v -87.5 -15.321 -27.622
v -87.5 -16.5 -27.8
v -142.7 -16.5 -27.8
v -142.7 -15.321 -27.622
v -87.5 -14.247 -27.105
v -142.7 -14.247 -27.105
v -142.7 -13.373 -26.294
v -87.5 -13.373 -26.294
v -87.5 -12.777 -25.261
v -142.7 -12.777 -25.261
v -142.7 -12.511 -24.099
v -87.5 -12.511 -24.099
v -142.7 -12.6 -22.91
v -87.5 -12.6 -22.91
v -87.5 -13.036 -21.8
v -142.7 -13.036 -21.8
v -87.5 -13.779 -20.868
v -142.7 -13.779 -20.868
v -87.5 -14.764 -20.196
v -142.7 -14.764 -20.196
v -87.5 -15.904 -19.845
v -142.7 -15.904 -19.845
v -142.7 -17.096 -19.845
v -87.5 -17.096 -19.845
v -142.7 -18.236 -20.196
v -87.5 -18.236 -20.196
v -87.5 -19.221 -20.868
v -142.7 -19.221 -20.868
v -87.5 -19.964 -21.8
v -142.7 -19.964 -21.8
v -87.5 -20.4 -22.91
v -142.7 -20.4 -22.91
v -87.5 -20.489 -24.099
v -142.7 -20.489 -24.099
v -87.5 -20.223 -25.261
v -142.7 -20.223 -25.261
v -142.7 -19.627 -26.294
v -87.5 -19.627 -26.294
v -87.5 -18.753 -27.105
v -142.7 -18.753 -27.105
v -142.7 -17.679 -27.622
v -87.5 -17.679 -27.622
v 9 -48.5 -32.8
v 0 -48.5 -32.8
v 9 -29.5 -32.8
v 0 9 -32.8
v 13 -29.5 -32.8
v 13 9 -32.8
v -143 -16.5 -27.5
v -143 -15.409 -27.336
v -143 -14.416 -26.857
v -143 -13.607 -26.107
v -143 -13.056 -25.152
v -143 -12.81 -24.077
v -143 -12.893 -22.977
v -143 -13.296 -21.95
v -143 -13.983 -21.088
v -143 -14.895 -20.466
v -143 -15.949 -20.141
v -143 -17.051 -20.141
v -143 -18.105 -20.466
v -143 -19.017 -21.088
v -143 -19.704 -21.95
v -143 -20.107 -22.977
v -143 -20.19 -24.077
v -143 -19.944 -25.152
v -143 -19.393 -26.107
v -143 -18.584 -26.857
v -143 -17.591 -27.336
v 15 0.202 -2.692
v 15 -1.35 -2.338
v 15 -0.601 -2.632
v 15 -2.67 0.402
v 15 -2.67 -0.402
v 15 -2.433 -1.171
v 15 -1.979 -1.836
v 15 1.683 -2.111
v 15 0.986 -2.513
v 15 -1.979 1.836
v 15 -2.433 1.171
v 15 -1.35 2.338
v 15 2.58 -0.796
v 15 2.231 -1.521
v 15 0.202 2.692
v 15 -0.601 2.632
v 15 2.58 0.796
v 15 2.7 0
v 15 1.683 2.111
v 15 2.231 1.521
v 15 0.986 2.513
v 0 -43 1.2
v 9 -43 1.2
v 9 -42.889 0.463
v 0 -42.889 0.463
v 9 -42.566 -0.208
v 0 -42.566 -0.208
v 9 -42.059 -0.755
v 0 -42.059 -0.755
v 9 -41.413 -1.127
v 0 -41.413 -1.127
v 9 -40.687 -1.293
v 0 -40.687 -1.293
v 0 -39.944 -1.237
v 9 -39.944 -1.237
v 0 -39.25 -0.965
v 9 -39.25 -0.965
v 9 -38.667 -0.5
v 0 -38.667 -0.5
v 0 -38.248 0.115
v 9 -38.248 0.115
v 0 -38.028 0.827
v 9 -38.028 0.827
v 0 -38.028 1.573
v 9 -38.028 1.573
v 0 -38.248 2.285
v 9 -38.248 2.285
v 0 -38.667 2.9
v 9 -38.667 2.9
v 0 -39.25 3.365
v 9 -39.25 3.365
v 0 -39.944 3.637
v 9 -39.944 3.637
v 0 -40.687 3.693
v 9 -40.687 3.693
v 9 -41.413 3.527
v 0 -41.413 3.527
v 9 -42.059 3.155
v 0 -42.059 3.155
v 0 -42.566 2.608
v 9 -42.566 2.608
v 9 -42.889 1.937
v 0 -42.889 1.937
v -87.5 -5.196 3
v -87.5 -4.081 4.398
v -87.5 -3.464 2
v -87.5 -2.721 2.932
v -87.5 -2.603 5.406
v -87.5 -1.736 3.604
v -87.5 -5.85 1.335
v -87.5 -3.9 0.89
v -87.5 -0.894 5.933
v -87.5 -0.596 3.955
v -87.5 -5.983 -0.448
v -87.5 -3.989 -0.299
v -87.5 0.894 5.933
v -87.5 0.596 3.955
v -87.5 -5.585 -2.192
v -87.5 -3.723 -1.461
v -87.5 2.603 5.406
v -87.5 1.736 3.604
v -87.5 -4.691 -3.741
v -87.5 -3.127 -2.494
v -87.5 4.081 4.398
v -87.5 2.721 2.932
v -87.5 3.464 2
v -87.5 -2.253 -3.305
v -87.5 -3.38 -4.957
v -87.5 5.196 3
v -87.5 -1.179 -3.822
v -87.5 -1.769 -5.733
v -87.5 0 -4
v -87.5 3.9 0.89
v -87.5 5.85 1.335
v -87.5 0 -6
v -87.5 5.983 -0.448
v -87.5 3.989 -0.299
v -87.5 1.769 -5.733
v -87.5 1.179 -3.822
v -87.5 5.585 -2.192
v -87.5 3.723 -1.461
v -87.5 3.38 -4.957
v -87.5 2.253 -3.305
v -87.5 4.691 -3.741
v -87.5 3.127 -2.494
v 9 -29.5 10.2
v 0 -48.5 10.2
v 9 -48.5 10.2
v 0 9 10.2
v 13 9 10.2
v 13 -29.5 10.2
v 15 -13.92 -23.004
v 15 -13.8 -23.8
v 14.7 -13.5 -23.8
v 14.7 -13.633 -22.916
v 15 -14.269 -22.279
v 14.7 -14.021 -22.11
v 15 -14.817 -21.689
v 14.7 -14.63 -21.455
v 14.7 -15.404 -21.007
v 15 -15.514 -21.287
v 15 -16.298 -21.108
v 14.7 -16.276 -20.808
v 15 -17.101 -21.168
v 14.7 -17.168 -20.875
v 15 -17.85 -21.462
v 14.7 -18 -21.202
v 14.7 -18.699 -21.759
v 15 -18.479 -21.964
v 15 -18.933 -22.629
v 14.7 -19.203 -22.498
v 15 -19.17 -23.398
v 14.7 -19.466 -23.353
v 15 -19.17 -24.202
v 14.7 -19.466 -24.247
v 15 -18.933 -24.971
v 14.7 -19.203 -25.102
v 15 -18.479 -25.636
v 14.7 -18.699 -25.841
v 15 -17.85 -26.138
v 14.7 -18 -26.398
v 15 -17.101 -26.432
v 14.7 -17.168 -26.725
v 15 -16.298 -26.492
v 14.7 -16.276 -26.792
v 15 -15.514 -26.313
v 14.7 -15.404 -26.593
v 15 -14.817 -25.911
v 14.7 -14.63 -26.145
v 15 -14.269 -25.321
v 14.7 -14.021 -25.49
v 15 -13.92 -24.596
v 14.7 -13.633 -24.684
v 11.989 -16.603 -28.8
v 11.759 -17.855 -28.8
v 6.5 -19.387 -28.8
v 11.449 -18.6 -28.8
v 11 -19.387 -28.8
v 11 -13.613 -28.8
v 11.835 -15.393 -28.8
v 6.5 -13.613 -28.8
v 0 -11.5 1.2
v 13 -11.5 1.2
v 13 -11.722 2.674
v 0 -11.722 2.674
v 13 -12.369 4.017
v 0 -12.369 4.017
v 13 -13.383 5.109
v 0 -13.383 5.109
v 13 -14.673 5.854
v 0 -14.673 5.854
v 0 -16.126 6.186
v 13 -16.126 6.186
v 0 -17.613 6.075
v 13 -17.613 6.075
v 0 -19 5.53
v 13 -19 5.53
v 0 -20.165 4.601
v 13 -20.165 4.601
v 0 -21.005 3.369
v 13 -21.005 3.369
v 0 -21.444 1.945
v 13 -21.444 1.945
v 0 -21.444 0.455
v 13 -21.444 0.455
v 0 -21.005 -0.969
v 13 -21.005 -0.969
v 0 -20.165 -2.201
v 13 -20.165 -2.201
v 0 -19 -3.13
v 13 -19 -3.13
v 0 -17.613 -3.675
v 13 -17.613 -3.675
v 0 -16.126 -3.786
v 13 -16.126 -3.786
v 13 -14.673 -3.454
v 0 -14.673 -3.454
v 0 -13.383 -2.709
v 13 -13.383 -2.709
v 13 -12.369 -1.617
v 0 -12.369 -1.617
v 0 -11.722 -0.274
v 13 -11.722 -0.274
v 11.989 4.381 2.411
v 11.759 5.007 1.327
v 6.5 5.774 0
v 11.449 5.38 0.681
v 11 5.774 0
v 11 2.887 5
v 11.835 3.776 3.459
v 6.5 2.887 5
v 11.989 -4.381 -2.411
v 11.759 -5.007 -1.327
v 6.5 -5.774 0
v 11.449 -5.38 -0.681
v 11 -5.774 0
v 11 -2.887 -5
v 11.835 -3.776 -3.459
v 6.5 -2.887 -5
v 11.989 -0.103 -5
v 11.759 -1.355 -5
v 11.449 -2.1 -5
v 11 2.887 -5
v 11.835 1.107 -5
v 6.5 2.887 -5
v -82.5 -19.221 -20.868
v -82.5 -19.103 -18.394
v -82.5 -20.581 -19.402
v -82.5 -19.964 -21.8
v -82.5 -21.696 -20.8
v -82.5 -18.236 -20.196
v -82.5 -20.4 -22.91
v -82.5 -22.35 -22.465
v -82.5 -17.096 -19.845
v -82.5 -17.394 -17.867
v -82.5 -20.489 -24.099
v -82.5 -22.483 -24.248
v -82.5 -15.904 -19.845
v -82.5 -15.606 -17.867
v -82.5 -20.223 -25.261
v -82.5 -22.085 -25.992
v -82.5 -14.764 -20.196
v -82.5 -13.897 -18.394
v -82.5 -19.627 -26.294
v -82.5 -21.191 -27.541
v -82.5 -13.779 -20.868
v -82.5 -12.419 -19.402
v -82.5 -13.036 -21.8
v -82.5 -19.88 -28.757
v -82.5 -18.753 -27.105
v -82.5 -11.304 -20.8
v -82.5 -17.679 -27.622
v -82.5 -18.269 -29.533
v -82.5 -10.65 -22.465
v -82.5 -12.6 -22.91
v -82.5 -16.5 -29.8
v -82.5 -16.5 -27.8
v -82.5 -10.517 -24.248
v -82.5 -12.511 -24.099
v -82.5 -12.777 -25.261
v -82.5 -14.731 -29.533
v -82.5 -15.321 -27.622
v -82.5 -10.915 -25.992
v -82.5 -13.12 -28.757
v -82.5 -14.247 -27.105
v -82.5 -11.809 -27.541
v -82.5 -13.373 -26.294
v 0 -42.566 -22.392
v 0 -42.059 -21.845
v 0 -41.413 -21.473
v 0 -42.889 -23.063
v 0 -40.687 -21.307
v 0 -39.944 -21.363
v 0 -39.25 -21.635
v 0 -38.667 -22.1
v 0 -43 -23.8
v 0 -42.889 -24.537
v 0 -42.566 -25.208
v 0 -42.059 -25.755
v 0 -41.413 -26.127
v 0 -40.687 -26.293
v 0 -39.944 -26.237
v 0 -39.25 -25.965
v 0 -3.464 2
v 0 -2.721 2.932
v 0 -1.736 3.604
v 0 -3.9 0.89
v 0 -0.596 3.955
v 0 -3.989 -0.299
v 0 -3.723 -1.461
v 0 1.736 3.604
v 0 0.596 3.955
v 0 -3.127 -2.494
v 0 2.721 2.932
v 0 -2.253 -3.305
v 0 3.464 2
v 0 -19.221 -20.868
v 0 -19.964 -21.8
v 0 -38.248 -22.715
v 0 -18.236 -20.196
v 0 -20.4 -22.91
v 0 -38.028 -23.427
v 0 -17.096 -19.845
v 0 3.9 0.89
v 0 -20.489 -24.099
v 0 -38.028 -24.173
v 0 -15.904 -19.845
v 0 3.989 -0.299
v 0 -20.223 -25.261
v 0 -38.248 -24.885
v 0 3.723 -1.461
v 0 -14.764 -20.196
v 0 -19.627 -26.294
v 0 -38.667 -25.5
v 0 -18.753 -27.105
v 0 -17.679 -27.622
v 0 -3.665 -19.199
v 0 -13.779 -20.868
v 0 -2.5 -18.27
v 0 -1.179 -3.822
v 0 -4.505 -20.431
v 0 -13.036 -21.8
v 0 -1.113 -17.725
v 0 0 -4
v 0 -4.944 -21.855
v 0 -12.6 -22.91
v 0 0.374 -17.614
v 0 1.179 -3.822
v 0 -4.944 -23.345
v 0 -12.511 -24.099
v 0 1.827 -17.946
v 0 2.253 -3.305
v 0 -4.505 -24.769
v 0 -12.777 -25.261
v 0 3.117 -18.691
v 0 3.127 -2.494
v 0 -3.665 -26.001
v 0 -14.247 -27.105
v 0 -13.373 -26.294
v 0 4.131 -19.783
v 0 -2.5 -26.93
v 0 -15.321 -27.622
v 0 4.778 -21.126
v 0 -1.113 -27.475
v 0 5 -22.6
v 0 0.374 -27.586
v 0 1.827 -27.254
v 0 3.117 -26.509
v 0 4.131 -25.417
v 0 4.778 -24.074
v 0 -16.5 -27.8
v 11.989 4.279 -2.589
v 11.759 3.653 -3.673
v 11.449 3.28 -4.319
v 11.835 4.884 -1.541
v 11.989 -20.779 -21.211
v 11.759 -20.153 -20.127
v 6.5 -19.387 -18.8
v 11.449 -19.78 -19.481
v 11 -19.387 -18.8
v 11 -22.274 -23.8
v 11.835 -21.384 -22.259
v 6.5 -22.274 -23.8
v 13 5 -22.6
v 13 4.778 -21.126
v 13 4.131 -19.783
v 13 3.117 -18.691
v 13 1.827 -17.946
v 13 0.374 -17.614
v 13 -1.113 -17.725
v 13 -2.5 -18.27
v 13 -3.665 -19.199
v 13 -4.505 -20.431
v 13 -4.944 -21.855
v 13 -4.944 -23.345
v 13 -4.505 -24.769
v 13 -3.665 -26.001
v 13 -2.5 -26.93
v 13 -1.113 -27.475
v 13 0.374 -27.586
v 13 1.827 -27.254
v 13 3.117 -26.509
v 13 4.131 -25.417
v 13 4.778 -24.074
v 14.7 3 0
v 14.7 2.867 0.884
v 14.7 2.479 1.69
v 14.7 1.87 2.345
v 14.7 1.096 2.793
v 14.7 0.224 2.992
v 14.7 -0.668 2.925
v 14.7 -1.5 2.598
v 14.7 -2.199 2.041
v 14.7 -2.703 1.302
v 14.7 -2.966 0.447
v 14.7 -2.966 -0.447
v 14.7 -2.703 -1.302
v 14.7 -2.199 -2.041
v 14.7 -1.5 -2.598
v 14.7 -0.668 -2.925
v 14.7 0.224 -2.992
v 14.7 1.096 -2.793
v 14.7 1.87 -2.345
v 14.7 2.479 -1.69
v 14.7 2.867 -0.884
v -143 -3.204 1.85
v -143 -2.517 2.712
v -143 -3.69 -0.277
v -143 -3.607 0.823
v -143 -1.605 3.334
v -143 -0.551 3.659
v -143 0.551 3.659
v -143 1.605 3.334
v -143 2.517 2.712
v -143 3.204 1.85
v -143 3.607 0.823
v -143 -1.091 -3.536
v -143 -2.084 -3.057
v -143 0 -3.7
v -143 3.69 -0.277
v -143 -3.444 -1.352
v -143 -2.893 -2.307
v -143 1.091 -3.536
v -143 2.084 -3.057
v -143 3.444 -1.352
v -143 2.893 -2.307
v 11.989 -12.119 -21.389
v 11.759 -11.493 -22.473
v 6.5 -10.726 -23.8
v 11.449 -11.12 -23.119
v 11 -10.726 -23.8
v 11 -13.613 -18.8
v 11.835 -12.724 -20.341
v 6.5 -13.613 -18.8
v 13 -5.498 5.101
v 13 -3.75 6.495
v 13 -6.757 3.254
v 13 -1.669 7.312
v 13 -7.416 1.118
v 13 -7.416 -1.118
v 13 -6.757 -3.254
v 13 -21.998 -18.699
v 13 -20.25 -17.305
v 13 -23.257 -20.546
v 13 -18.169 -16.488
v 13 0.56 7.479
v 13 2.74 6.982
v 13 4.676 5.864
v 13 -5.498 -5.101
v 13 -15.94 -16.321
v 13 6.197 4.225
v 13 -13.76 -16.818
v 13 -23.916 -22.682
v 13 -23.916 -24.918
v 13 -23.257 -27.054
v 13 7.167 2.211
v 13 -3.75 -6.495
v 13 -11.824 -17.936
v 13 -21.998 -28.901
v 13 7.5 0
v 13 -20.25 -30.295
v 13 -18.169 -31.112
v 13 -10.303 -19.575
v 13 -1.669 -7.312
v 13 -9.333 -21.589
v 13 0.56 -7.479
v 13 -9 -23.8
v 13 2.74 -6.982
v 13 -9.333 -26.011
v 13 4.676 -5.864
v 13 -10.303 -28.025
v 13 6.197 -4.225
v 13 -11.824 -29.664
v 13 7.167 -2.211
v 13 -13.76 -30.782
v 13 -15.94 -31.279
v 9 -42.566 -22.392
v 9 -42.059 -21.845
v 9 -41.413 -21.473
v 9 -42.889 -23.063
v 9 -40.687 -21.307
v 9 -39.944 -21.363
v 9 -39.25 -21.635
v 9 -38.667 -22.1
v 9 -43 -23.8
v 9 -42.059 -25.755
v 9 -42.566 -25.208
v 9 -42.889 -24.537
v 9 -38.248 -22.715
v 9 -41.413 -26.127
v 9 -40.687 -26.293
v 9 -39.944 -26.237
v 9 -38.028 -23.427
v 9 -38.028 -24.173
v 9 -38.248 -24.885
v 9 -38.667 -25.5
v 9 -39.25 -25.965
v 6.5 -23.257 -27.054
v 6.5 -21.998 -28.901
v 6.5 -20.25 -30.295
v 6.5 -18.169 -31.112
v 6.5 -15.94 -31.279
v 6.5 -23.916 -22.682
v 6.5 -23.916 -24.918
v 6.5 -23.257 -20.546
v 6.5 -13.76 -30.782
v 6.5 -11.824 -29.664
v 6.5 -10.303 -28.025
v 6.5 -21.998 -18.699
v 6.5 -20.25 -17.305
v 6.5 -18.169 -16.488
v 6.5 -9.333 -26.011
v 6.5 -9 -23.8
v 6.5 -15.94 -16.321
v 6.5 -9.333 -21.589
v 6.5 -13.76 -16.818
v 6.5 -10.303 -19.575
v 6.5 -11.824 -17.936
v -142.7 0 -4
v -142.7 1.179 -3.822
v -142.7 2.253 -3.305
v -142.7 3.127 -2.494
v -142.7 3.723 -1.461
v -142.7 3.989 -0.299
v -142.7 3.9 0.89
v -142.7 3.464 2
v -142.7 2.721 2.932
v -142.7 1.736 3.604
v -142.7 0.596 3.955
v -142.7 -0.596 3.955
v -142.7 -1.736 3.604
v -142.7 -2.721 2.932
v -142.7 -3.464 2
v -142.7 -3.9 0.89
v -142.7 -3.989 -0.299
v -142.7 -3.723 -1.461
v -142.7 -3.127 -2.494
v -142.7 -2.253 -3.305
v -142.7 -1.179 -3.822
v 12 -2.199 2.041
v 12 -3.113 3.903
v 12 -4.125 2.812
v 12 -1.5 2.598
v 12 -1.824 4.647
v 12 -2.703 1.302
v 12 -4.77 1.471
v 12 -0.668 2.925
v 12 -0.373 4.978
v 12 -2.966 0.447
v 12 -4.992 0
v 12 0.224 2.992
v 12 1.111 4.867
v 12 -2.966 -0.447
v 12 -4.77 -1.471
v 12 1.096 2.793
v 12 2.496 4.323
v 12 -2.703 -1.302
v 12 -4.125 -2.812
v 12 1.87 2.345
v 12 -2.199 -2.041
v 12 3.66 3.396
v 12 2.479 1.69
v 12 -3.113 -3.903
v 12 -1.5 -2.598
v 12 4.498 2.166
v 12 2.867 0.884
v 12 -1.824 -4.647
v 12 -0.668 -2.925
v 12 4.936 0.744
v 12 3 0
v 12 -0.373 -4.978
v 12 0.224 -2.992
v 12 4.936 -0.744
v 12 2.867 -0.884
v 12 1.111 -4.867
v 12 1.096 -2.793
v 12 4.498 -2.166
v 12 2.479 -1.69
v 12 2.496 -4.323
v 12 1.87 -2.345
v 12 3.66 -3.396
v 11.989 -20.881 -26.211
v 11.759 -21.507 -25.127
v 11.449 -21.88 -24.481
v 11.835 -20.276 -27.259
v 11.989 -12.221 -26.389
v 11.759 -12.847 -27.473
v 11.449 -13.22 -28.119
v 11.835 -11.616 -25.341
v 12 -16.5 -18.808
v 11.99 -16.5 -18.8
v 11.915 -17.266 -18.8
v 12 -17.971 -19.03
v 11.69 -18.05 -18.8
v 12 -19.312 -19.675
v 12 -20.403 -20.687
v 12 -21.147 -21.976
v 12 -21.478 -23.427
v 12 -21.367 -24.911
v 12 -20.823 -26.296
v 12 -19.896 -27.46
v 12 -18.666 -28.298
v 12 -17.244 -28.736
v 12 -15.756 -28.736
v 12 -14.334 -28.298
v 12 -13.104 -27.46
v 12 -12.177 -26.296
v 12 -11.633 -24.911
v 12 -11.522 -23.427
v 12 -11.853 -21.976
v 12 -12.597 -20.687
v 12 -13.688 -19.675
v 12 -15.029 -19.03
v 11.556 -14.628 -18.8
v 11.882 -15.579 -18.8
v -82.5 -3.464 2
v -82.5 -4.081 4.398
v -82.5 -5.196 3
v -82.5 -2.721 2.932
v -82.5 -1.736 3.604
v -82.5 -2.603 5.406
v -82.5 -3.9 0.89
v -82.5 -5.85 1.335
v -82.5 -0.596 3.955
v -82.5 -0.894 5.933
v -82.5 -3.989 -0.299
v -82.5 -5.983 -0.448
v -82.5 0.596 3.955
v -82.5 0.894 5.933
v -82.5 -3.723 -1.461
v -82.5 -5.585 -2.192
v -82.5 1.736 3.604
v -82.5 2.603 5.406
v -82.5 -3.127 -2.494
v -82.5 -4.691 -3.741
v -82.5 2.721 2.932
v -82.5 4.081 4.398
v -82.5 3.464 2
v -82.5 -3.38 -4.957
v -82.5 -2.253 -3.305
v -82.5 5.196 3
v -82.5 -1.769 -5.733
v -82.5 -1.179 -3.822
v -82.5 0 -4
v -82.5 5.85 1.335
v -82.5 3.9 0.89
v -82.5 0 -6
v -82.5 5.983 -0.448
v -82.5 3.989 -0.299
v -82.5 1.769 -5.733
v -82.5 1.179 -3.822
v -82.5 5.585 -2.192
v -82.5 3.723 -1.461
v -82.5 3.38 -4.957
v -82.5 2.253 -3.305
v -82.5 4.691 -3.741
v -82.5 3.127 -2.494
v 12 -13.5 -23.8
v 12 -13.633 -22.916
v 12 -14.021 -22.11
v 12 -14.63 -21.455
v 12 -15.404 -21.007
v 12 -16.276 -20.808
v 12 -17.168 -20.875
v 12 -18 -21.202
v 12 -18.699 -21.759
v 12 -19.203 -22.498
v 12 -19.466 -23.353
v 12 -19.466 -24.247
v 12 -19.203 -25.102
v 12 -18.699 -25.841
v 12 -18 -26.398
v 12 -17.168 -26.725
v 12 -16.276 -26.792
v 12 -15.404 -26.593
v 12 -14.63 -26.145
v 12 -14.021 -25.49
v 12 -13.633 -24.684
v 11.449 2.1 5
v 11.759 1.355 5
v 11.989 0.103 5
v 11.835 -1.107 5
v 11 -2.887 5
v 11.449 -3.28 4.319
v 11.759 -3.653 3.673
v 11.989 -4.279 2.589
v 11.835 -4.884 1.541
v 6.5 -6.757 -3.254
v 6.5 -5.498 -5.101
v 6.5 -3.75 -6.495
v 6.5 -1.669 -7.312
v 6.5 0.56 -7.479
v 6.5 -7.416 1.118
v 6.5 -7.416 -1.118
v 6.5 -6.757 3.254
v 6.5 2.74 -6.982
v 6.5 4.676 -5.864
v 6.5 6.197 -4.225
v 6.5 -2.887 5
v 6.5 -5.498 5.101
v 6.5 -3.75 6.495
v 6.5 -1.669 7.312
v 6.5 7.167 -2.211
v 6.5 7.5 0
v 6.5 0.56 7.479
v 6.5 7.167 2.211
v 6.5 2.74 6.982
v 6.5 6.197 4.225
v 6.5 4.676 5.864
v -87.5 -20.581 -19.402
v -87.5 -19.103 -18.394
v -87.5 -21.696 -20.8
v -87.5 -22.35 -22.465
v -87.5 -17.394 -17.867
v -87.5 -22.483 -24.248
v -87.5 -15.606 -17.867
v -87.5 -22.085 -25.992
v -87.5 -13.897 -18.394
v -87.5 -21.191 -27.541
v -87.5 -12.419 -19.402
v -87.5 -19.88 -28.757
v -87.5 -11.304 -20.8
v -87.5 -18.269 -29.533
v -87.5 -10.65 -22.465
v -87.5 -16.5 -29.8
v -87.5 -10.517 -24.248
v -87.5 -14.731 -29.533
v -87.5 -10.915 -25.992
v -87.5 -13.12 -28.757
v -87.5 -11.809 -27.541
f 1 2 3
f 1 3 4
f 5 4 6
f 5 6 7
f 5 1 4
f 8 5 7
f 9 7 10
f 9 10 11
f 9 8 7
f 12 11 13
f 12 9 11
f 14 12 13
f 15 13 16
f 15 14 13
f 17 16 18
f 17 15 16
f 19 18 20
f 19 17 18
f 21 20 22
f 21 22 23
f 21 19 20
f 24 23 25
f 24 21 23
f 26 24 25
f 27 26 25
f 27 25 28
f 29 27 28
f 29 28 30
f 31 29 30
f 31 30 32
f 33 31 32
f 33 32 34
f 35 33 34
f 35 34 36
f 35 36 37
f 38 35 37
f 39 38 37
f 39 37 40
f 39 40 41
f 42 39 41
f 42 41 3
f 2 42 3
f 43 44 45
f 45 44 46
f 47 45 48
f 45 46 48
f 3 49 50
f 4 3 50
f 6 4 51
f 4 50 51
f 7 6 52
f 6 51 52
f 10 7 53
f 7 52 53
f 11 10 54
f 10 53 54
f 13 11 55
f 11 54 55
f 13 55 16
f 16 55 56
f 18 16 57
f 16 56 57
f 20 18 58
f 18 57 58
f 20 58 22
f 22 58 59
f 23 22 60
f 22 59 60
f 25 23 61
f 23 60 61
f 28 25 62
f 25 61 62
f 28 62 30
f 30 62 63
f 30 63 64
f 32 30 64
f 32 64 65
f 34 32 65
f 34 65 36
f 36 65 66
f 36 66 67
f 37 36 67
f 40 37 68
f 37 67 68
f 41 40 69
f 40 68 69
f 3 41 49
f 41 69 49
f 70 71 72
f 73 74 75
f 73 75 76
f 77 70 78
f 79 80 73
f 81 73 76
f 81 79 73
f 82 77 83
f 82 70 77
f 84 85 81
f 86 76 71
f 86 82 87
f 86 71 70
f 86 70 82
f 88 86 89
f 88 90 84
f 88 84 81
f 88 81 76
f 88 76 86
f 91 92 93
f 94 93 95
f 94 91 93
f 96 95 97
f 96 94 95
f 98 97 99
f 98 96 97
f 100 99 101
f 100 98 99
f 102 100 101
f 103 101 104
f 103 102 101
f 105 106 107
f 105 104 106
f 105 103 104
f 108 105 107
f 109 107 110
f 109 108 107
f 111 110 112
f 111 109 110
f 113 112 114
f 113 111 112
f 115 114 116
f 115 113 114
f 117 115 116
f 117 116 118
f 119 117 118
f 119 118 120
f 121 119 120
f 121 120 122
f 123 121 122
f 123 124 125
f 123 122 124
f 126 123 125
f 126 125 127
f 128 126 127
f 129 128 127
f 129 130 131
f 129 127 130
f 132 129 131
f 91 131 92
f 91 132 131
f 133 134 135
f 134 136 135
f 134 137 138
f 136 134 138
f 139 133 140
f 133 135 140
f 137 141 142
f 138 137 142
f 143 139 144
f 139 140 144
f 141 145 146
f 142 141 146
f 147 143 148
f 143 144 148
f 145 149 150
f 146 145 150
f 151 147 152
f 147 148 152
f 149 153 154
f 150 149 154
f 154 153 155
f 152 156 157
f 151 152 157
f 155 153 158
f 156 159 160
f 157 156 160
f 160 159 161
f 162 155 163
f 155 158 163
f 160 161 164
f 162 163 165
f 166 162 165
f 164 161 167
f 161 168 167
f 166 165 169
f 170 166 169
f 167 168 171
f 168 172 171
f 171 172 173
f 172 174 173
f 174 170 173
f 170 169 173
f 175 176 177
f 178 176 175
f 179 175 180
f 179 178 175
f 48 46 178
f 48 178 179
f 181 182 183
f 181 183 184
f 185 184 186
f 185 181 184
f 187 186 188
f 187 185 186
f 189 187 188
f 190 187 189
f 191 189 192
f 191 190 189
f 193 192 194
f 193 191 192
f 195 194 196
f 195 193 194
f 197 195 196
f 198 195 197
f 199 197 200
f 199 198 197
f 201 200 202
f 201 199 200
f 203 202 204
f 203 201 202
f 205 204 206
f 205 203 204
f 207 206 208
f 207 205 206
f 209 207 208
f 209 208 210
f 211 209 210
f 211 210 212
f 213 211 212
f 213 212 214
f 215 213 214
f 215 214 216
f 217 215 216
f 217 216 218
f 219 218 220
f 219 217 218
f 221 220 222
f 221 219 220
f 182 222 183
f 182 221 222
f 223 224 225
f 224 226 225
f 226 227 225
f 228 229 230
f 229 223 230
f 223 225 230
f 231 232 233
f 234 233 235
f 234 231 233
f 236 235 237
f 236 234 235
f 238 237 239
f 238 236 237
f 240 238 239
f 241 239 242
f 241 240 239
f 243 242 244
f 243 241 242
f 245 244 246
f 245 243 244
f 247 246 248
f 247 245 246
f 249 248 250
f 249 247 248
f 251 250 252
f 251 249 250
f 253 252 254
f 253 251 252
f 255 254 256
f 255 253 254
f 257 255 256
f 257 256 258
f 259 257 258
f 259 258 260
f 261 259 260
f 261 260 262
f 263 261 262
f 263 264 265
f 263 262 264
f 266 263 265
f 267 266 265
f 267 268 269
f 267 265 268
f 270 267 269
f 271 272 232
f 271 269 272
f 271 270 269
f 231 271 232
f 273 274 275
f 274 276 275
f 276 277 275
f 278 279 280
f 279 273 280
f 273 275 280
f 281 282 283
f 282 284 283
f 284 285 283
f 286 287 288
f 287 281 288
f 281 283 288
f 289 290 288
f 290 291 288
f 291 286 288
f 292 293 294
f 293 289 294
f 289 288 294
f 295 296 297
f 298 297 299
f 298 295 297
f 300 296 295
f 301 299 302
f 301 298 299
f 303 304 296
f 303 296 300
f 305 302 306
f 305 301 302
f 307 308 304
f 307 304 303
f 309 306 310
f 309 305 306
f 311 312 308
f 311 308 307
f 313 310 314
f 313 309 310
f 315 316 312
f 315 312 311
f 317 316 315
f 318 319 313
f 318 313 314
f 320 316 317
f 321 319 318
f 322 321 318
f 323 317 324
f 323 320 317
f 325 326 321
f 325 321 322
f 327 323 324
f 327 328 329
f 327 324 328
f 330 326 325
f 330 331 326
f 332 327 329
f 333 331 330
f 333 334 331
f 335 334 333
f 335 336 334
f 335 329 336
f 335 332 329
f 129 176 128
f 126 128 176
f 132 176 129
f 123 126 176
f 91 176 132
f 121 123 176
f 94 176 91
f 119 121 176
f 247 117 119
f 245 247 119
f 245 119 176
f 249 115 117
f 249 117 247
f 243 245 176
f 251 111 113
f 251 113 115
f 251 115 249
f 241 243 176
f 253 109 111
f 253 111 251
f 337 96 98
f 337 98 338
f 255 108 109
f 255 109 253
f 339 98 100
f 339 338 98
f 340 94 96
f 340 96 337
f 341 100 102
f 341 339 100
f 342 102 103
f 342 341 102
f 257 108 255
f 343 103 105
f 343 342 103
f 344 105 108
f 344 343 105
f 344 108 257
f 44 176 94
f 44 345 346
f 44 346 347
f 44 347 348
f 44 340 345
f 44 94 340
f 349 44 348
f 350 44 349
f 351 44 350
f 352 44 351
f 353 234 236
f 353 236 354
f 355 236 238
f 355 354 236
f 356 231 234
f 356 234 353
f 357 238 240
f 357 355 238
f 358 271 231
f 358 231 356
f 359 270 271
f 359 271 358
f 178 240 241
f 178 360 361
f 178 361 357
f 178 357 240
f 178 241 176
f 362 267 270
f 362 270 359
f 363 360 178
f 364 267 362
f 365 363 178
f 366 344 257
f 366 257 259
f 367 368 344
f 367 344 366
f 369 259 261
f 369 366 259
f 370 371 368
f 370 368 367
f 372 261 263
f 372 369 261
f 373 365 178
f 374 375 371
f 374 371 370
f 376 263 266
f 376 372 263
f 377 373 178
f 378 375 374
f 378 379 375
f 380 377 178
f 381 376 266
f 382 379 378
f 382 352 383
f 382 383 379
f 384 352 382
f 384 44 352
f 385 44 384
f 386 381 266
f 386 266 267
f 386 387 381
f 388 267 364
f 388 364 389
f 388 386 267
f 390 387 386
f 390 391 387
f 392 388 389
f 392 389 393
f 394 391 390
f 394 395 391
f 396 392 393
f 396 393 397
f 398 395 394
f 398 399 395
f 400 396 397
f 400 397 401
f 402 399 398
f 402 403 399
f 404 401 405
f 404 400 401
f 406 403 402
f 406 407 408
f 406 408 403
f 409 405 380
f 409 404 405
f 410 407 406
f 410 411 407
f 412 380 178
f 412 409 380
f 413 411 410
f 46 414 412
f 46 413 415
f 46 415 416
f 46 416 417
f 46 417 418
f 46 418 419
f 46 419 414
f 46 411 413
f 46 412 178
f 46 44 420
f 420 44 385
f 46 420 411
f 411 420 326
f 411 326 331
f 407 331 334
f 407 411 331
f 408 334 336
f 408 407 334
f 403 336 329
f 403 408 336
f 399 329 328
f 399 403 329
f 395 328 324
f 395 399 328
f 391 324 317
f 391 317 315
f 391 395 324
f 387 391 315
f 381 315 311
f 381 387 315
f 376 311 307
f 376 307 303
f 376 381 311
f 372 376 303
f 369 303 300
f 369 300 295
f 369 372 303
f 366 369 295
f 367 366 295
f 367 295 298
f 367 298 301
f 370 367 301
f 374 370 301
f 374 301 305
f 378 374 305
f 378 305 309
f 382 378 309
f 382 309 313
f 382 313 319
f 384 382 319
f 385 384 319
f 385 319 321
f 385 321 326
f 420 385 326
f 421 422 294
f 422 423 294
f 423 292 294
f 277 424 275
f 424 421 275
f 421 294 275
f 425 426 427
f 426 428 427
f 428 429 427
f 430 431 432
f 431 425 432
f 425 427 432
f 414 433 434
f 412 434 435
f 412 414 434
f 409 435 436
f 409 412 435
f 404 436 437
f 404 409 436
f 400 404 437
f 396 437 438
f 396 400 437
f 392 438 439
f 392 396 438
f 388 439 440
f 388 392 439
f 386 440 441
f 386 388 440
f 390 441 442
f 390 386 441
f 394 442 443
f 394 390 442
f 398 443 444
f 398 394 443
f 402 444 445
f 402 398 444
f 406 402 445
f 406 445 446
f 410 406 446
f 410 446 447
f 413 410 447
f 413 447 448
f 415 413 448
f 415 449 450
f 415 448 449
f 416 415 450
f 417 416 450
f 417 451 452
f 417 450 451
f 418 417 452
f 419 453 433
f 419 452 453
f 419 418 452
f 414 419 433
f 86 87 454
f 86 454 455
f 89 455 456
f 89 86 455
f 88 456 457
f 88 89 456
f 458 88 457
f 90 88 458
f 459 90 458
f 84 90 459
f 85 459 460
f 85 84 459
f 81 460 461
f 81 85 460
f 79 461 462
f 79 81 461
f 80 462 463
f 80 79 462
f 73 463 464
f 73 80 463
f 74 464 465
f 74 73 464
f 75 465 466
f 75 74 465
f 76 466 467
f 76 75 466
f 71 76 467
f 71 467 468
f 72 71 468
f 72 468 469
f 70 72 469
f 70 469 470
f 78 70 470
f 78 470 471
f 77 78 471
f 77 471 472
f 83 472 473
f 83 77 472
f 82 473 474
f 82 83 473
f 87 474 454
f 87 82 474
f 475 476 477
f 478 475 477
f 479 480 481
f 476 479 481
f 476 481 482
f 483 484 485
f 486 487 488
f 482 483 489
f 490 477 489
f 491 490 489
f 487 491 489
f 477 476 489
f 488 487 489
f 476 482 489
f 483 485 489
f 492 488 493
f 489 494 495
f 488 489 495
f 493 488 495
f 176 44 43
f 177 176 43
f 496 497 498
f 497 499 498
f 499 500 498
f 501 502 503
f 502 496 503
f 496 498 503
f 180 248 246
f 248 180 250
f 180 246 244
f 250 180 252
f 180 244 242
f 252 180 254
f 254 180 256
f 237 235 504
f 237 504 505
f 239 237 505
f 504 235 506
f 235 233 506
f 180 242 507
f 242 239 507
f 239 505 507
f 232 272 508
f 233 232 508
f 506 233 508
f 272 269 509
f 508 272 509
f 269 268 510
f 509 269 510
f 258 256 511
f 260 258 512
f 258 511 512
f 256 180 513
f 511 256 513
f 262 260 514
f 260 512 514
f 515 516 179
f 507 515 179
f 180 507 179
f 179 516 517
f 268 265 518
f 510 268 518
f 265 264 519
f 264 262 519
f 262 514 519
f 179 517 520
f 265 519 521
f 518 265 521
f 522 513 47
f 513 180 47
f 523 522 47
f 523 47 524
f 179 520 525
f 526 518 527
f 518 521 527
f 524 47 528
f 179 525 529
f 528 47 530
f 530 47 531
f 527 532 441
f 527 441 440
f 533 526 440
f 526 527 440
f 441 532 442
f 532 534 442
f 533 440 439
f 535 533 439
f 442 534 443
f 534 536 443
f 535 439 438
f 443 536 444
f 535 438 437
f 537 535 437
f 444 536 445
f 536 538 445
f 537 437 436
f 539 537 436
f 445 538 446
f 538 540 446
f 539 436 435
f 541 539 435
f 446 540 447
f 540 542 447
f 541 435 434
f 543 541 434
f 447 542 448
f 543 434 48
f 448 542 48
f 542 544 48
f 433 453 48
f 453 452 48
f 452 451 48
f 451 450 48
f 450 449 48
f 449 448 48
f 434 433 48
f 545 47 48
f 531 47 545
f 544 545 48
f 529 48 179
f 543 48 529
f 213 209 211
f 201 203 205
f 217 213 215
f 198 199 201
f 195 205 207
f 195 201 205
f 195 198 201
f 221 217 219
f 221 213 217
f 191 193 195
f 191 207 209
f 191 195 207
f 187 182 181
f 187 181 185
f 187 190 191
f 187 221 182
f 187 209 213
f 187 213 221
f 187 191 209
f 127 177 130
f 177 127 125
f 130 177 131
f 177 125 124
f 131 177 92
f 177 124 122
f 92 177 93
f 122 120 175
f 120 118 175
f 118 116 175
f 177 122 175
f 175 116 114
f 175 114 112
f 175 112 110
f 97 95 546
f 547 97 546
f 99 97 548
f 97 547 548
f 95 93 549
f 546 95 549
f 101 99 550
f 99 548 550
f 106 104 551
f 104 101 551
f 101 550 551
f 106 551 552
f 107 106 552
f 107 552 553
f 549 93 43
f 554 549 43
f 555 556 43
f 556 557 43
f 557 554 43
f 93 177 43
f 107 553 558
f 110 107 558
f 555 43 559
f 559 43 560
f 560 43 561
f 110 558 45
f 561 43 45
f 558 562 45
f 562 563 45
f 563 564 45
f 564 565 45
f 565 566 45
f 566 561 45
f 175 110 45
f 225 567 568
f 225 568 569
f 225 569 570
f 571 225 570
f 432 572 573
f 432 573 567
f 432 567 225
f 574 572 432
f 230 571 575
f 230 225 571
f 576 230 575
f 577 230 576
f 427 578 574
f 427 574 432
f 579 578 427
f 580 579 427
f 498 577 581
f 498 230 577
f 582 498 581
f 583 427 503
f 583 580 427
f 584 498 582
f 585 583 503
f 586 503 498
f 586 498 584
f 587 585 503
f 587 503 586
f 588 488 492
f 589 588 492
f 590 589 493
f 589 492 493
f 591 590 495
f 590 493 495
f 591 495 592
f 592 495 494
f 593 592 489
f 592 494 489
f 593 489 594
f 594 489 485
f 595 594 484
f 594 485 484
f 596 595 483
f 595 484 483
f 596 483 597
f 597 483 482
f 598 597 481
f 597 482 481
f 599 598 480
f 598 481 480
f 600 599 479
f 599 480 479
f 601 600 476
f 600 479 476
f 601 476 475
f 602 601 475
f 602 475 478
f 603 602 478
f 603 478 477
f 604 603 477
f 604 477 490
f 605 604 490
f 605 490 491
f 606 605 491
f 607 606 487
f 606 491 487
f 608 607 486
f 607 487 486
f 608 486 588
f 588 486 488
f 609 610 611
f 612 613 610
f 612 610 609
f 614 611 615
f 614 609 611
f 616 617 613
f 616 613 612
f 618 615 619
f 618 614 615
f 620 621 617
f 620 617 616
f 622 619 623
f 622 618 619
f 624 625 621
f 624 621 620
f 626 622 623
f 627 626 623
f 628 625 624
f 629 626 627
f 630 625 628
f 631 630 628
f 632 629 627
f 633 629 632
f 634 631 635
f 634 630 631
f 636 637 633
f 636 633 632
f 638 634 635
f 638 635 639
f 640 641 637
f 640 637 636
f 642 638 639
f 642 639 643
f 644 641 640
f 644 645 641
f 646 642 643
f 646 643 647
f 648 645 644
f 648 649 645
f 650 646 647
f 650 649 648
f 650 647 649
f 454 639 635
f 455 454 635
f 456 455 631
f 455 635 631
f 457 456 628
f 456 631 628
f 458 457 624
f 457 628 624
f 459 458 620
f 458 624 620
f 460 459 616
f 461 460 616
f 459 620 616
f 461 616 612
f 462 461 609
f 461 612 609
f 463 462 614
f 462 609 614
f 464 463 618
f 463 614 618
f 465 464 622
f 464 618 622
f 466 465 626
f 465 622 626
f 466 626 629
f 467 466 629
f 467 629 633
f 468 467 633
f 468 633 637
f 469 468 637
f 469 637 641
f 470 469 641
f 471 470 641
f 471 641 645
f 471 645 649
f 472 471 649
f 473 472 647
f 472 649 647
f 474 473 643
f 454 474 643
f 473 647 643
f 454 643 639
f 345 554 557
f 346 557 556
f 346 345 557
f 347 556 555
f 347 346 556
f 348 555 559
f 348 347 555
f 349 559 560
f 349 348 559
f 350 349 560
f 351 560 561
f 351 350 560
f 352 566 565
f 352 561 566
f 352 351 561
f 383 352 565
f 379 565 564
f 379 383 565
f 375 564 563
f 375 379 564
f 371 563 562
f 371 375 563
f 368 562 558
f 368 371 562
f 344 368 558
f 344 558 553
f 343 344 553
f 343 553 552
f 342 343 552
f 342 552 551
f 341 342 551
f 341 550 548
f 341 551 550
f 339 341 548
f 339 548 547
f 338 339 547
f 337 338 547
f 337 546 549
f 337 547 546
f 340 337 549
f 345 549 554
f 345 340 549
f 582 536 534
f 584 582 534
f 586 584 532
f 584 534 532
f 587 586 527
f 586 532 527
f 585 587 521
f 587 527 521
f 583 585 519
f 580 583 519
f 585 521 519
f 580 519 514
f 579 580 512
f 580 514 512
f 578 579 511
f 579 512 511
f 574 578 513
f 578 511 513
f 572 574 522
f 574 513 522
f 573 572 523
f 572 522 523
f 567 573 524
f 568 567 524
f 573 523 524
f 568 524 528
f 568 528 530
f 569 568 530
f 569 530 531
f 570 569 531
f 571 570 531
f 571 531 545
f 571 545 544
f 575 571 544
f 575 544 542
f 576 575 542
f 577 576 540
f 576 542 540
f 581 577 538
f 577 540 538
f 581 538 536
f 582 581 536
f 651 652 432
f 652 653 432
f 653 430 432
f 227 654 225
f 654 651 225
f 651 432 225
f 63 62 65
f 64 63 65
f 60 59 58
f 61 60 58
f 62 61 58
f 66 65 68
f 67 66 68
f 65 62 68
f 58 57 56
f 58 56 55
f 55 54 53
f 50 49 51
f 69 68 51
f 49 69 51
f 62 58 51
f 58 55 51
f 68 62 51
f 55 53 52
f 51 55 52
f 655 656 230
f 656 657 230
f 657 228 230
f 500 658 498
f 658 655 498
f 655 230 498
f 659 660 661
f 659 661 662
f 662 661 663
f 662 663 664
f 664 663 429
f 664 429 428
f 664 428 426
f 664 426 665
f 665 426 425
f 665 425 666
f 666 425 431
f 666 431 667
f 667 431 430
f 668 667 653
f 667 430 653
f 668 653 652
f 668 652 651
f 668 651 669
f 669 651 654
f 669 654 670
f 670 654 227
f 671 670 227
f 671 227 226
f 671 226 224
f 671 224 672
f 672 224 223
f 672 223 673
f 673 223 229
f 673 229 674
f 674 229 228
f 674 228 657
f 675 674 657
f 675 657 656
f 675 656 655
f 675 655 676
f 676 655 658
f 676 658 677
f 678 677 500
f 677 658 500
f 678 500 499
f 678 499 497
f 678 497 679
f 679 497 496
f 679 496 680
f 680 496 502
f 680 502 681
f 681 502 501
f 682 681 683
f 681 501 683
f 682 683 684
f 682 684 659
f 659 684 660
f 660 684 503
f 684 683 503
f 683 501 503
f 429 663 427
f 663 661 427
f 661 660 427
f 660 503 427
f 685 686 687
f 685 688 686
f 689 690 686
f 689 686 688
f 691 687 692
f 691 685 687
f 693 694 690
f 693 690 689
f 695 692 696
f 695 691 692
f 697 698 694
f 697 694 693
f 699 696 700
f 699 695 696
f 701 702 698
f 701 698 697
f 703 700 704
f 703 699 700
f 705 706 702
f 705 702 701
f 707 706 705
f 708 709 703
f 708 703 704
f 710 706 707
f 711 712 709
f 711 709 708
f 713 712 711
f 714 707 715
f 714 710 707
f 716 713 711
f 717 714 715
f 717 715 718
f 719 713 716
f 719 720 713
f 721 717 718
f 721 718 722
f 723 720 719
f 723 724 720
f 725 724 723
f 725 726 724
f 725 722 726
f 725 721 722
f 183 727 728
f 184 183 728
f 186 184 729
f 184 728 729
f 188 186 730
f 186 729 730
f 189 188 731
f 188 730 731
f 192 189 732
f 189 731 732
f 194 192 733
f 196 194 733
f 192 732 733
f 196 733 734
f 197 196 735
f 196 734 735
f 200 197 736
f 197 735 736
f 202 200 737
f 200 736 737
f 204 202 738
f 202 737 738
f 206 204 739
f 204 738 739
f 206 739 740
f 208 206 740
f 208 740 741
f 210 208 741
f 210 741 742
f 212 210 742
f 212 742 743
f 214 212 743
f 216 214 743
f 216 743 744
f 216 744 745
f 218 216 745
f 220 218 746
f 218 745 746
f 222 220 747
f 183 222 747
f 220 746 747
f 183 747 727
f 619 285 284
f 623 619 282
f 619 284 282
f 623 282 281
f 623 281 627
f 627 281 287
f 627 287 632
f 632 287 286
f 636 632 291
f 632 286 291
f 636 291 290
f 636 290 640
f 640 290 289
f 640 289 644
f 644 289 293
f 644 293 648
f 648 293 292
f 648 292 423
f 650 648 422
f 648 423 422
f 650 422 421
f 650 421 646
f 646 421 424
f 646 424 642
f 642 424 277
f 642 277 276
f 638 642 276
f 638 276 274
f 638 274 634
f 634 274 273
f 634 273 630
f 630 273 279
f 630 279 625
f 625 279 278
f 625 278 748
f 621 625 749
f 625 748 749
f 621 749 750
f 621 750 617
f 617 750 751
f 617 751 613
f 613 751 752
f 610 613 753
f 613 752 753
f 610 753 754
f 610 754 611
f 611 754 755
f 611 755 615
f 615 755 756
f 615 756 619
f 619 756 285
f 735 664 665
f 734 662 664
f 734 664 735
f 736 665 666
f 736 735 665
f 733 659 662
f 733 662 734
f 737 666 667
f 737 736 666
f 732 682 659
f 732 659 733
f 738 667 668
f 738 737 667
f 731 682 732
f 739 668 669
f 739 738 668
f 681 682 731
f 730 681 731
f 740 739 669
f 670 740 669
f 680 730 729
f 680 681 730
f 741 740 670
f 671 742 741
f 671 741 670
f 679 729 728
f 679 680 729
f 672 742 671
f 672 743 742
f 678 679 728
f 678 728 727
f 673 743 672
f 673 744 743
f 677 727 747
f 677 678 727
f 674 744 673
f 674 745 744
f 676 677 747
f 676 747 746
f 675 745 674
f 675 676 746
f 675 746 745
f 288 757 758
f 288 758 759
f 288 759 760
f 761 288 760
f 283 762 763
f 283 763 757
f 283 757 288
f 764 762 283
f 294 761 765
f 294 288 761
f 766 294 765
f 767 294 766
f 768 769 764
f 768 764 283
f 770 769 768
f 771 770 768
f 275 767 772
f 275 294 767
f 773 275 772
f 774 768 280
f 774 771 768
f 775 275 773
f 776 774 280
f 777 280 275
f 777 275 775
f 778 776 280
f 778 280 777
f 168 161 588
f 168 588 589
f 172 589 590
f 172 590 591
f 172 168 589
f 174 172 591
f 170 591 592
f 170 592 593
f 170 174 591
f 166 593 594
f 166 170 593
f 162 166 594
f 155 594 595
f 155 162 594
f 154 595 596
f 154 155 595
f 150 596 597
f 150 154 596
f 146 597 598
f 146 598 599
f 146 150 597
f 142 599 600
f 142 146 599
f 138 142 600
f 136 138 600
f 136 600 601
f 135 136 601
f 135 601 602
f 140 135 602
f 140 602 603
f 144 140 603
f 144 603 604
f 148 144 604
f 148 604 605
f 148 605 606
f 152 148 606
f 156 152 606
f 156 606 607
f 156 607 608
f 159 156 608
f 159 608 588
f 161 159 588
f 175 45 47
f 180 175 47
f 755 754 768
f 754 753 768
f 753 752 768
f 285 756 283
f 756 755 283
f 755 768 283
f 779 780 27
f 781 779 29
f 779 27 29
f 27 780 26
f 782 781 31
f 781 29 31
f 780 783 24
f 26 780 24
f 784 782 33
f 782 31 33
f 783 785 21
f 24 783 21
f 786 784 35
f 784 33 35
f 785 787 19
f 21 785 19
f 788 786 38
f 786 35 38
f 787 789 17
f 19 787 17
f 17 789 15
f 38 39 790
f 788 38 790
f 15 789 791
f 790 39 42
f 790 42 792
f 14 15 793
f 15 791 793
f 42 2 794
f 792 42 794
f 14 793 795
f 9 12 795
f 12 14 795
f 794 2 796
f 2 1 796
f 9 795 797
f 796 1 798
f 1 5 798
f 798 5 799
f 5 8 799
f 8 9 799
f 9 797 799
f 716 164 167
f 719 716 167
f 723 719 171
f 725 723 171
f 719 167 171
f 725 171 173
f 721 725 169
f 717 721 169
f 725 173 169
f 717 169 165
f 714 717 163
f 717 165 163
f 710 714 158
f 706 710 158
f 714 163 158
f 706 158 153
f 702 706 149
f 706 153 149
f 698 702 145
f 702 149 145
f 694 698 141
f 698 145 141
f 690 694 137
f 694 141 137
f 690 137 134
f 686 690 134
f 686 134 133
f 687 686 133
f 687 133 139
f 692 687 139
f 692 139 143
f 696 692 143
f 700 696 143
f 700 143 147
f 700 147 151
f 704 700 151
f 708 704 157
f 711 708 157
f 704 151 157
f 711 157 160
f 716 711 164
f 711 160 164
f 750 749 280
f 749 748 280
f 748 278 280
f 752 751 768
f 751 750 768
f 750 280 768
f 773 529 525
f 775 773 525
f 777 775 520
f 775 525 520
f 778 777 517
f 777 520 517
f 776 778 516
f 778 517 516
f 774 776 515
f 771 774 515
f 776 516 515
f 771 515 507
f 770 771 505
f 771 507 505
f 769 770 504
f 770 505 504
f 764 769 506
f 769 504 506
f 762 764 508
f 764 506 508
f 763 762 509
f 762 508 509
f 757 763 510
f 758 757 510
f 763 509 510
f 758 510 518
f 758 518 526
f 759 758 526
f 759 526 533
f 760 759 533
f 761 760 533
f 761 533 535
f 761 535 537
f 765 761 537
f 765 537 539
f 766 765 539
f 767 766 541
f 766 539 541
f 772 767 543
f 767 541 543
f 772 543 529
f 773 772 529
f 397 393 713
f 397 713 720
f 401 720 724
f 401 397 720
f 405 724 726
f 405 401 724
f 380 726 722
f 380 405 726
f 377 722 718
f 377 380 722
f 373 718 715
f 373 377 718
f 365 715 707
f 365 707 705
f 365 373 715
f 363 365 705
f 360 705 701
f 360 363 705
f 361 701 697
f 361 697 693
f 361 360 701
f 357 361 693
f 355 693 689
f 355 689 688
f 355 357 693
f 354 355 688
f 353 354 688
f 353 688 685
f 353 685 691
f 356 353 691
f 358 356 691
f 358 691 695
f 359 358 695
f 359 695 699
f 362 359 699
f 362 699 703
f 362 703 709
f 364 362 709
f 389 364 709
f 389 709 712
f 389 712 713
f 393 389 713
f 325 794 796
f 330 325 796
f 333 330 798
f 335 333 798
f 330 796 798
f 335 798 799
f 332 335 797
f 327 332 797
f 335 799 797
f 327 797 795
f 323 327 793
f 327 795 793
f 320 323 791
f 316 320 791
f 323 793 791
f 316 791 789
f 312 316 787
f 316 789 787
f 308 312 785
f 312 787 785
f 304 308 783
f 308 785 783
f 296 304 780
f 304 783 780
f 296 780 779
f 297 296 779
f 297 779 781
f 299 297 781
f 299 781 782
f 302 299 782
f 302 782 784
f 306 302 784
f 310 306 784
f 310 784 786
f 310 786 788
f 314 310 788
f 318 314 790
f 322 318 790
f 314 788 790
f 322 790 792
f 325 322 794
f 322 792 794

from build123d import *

# Parameters (mm, degrees)
BOSS_EXTRUDE1_DEPTH      = 10.2
BOSS_EXTRUDE1_DEPTH_BACK = 32.8
SKETCH1_W                = 13
SKETCH1_H                = 57.5
CUT_EXTRUDE1_DEPTH       = 60.975745097
CUT_EXTRUDE1_DEPTH_BACK  = 60.975745097
SKETCH3_W                = 4
SKETCH3_H                = 19
SKETCH4_R                = 7.5
CUT_EXTRUDE2_DEPTH       = 6.5
BOSS_EXTRUDE2_DEPTH      = 5.5
SKETCH8_R                = 3
BOSS_EXTRUDE3_DEPTH      = 3
CHAMFER1_SIZE            = 0.3
SKETCH10_R               = 5
CUT_EXTRUDE3_DEPTH       = 61.44079748
SKETCH9_R                = 4
BOSS_EXTRUDE4_DEPTH      = 143
CHAMFER2_SIZE            = 0.3
SKETCH11_R               = 2.5
CUT_EXTRUDE4_DEPTH       = 155.522134337
SKETCH12_R               = 6
BOSS_EXTRUDE5_DEPTH      = 5


with BuildPart() as part:
    # Sketch1 → Boss-Extrude1 (new, two sides: drawn at the far end of the back side and taken through both)
    with BuildSketch(Plane.XY.offset(-BOSS_EXTRUDE1_DEPTH_BACK)):
        with Locations((6.5, -19.75)):
            Rectangle(SKETCH1_W, SKETCH1_H)
    extrude(amount=BOSS_EXTRUDE1_DEPTH + BOSS_EXTRUDE1_DEPTH_BACK)

    # Sketch3 → Cut-Extrude1 (cut, two sides: drawn at the far end of the back side and taken through both)
    with BuildSketch(Plane.XY.offset(-CUT_EXTRUDE1_DEPTH_BACK)):
        with Locations((11, -39)):
            Rectangle(SKETCH3_W, SKETCH3_H)
    extrude(amount=CUT_EXTRUDE1_DEPTH + CUT_EXTRUDE1_DEPTH_BACK, mode=Mode.SUBTRACT)

    # Sketch4 → Cut-Extrude2 (cut)
    with BuildSketch(Plane(origin=(13, 0, 0), x_dir=(0, 0, -1), z_dir=(1, 0, 0))):
        with Locations(Location((0, 0, 0), (0, 0, 90))):
            Circle(SKETCH4_R)
        with Locations(Location((23.8, -16.5, 0), (0, 0, 90))):
            Circle(SKETCH4_R)
    extrude(amount=-CUT_EXTRUDE2_DEPTH, mode=Mode.SUBTRACT)

    # Sketch5 → Boss-Extrude2 (add)
    with BuildSketch(Plane(origin=(6.5, 0, 0), x_dir=(0, 0, -1), z_dir=(1, 0, 0))):
        Polygon((0, 5.773502692), (-5, 2.886751346), (-5, -2.886751346), (0, -5.773502692), (5, -2.886751346), (5, 2.886751346), align=None)
        Polygon((23.8, -10.726497308), (18.8, -13.613248654), (18.8, -19.386751346), (23.8, -22.273502692), (28.8, -19.386751346), (28.8, -13.613248654), align=None)
    extrude(amount=BOSS_EXTRUDE2_DEPTH)

    # Sketch6 → Cut-Revolve1 (revolve, cut)
    with BuildSketch(Plane(origin=(0, 0, 0), x_dir=(-1, 0, 0), z_dir=(0, 0, -1)), mode=Mode.PRIVATE) as cut_revolve1_sk:
        Polygon((-12, 5.773502692), (-12, 4.992217065), (-11, 5.773502692), align=None)
    revolve(cut_revolve1_sk.sketch.rotate(Axis((6.5, 0, 0), (1, 0, 0)), 180), axis=Axis((6.5, 0, 0), (1, 0, 0)), mode=Mode.SUBTRACT)

    # Sketch7 → Cut-Revolve2 (revolve, cut)
    with BuildSketch(Plane(origin=(0, 0, -23.8), x_dir=(-1, 0, 0), z_dir=(0, 0, -1)), mode=Mode.PRIVATE) as cut_revolve2_sk:
        Polygon((-11, -10.726497308), (-12, -10.726497308), (-12, -11.507782935), align=None)
    revolve(cut_revolve2_sk.sketch.rotate(Axis((6.5, -16.5, -23.8), (1, 0, 0)), 90), axis=Axis((6.5, -16.5, -23.8), (1, 0, 0)), mode=Mode.SUBTRACT)

    # Sketch8 → Boss-Extrude3 (add)
    with BuildSketch(Plane(origin=(12, 0, 0), x_dir=(0, 0, -1), z_dir=(1, 0, 0))):
        with Locations(Location((0, 0, 0), (0, 0, 90))):
            Circle(SKETCH8_R)
        with Locations(Location((23.8, -16.5, 0), (0, 0, 90))):
            Circle(SKETCH8_R)
    extrude(amount=BOSS_EXTRUDE3_DEPTH)

    # Chamfer1
    chamfer1_edges = [part.edges().sort_by_distance(p)[0] for p in [
        (15, -3, 0),
        (15, -19.5, -23.8),
    ]]
    chamfer(chamfer1_edges, length=CHAMFER1_SIZE)

    # Sketch10 → Cut-Extrude3 (cut, through all)
    with BuildSketch(Plane(origin=(0, 0, 0), x_dir=(0, 0, -1), z_dir=(1, 0, 0))):
        with Locations(Location((22.6, 0, 0), (0, 0, 90))):
            Circle(SKETCH10_R)
        with Locations(Location((-1.2, -16.5, 0), (0, 0, 90))):
            Circle(SKETCH10_R)
    extrude(amount=CUT_EXTRUDE3_DEPTH, mode=Mode.SUBTRACT)

    # Sketch9 → Boss-Extrude4 (add)
    with BuildSketch(Plane(origin=(0, 0, 0), x_dir=(0, 0, -1), z_dir=(1, 0, 0))):
        with Locations((23.8, -16.5)):
            Circle(SKETCH9_R)
        Circle(SKETCH9_R)
    extrude(amount=-BOSS_EXTRUDE4_DEPTH)

    # Chamfer2
    chamfer2_edges = [part.edges().sort_by_distance(p)[0] for p in [
        (-143, -16.5, -19.8),
        (-143, 0, 4),
    ]]
    chamfer(chamfer2_edges, length=CHAMFER2_SIZE)

    # Sketch11 → Cut-Extrude4 (cut, through all)
    with BuildSketch(Plane(origin=(0, 0, 0), x_dir=(0, 0, -1), z_dir=(1, 0, 0))):
        with Locations(Location((-1.2, -40.5, 0), (0, 0, 270))):
            Circle(SKETCH11_R)
        with Locations(Location((23.8, -40.5, 0), (0, 0, 270))):
            Circle(SKETCH11_R)
    extrude(amount=CUT_EXTRUDE4_DEPTH, mode=Mode.SUBTRACT)

    # Sketch12 → Boss-Extrude5 (add)
    with BuildSketch(Plane(origin=(-87.5, 0, 0), x_dir=(0, 0, -1), z_dir=(1, 0, 0))):
        Circle(SKETCH12_R)
        with Locations((23.8, -16.5)):
            Circle(SKETCH12_R)
    extrude(amount=BOSS_EXTRUDE5_DEPTH)


solid = part.part
